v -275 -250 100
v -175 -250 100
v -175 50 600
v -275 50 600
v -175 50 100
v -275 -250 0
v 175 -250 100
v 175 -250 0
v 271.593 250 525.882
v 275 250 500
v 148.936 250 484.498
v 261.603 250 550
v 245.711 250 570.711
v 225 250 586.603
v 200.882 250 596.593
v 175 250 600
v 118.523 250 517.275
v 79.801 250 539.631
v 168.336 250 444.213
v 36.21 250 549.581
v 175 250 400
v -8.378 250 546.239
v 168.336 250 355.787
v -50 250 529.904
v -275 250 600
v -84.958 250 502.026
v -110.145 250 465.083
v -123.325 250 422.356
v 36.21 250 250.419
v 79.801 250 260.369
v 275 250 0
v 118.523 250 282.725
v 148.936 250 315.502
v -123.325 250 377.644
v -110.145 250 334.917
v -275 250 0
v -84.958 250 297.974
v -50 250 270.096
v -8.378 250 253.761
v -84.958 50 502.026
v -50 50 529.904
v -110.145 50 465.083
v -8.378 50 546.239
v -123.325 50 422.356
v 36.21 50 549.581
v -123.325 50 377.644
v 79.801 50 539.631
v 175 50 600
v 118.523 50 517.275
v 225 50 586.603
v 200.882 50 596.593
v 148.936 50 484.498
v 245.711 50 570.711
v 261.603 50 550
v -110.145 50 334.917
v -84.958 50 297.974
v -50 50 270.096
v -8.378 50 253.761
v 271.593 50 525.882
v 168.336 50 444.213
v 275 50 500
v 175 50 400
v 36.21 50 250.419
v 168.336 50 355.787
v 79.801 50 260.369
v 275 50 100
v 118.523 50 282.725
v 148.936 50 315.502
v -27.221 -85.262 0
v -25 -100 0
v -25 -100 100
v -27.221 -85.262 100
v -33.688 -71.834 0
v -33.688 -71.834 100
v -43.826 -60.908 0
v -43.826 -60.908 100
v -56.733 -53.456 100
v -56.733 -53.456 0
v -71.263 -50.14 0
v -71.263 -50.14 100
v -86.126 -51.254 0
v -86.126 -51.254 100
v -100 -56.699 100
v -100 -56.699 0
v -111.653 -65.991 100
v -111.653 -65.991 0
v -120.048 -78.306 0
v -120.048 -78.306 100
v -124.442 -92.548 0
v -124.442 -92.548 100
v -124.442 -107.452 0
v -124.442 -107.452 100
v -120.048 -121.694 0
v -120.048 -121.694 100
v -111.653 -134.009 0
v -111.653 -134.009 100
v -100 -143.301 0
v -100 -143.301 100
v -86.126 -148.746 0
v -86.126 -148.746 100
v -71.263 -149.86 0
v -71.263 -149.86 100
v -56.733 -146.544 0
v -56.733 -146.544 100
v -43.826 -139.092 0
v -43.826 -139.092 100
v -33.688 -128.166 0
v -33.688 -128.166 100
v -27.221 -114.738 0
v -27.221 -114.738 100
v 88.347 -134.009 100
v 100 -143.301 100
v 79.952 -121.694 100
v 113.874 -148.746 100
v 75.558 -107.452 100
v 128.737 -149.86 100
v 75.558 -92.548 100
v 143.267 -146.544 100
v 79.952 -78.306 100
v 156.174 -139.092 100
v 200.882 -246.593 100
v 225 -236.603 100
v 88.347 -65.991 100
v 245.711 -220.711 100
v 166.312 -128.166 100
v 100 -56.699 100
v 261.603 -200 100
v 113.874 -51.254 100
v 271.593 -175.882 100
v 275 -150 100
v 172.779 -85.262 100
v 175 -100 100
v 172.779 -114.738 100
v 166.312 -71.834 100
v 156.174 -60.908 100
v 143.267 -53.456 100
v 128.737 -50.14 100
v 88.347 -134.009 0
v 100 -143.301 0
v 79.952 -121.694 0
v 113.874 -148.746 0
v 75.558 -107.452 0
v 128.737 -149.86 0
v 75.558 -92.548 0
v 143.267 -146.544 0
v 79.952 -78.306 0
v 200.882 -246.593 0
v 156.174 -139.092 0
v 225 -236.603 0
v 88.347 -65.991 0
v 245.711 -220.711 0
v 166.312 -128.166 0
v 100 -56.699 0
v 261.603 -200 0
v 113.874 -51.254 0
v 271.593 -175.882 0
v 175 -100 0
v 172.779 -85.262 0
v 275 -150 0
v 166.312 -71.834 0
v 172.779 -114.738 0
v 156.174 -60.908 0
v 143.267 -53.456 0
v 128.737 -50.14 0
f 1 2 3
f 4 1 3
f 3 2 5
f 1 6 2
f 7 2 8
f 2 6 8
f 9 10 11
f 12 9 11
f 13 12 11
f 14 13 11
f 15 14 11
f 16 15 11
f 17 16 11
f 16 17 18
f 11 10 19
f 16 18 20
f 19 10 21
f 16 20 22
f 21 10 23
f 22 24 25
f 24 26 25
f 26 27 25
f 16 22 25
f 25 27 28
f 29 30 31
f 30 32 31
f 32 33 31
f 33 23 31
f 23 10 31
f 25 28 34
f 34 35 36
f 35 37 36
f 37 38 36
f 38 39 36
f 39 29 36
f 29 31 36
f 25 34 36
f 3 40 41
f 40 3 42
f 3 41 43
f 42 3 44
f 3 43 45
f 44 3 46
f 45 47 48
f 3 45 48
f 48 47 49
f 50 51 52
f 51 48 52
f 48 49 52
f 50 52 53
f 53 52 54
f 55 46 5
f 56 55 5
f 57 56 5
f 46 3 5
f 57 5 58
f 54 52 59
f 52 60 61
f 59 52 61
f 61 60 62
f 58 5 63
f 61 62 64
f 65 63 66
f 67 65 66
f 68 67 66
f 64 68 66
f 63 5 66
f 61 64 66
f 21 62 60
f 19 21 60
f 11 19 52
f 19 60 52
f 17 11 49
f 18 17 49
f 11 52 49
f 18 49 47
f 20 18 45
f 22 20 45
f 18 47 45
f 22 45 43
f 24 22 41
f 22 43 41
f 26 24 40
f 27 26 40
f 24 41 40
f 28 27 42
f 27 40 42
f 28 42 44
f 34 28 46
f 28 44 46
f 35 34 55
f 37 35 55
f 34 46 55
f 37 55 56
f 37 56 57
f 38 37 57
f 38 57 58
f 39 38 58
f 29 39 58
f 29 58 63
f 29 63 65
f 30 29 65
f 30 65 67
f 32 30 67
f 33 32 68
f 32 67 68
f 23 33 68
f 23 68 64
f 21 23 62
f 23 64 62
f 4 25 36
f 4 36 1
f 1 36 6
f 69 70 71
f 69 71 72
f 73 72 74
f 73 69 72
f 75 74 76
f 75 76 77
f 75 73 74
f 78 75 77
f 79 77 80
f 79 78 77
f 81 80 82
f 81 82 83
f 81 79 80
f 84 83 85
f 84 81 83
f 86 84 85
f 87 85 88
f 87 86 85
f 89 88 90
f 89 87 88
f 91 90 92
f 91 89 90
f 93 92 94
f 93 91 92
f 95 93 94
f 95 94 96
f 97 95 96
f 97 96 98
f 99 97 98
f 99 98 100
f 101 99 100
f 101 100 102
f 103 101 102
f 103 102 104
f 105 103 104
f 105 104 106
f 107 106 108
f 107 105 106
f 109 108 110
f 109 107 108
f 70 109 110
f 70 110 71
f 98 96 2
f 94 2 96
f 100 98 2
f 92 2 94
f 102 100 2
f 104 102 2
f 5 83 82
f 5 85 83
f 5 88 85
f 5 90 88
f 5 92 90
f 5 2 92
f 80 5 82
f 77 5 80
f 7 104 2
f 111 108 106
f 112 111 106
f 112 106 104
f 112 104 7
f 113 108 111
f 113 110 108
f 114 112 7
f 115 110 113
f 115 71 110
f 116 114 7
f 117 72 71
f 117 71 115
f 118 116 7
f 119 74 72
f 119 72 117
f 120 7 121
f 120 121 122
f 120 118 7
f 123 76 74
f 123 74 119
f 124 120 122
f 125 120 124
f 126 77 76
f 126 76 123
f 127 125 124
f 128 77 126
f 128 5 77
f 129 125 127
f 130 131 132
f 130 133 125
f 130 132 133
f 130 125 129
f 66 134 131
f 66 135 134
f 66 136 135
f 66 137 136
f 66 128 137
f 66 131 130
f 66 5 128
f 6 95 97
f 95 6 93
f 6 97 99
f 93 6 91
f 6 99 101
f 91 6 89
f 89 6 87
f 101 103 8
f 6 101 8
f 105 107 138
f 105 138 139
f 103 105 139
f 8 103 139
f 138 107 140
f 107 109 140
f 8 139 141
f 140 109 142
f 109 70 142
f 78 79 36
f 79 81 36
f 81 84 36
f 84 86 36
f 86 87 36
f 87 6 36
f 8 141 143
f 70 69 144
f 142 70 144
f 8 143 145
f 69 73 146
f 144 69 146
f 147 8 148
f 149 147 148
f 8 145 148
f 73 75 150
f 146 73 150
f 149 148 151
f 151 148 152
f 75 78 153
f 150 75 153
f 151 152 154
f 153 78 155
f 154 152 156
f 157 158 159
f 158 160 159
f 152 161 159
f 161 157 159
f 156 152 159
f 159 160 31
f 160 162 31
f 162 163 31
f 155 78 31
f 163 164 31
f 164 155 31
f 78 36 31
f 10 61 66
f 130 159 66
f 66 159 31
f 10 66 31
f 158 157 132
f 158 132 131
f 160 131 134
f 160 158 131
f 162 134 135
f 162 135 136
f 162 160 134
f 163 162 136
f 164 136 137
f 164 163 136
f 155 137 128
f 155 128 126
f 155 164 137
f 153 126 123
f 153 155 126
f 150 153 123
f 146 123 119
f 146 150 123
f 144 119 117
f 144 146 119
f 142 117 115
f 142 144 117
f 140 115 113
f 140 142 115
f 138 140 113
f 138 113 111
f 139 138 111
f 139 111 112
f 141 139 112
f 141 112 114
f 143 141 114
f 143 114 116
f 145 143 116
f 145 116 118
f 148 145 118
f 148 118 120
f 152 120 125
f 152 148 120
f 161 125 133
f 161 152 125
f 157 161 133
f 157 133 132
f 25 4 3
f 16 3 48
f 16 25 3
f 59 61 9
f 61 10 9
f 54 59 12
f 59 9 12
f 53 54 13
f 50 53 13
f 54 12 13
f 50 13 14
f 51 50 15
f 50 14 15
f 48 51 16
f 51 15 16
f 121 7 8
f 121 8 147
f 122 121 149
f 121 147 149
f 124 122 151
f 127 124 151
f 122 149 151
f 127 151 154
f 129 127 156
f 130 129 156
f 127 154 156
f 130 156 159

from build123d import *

# Parameters (mm, degrees)
F0_R     = 50
F0_W     = 100
F0_H     = 300
F1_DEPTH = 100
F2_DEPTH = 600
F3_R     = 100
F5_DEPTH = 100
F6_R     = 150
F7_DEPTH = 200


with BuildPart() as f1:
    # F0 (on Top) → F1 (new body)
    with BuildSketch(Plane.XY):
        with BuildLine():
            Line((-175, -250), (175, -250))
            ThreePointArc((175, -250), (245.7106781187, -220.7106781187), (275, -150))
            Line((275, -150), (275, 50))
            Line((275, 50), (-175, 50))
            Line((-175, 50), (-175, -250))
        make_face()
        with Locations((-75, -100)):
            Circle(F0_R, mode=Mode.SUBTRACT)
        with Locations((125, -100)):
            Circle(F0_R, mode=Mode.SUBTRACT)
        Polygon((-275, 50), (-175, 50), (275, 50), (275, 250), (-275, 250), align=None)
        with Locations((-225, -100)):
            Rectangle(F0_W, F0_H)
    extrude(amount=F1_DEPTH)

    # F0 (on Top) → F2 (join)
    with BuildSketch(Plane.XY):
        Polygon((-275, 50), (-175, 50), (275, 50), (275, 250), (-275, 250), align=None)
        with Locations((-225, -100)):
            Rectangle(F0_W, F0_H)
    extrude(amount=F2_DEPTH)

    # F3
    f3_edges = [f1.edges().sort_by_distance(p)[0] for p in [
        (275, 150, 600),
    ]]
    fillet(f3_edges, radius=F3_R)

    # F4 (on face) → F5 (cut)
    with BuildSketch(Plane.YZ.offset(-175)):
        Polygon((-250, 100), (50, 600), (-250, 600), align=None)
    extrude(amount=-F5_DEPTH, mode=Mode.SUBTRACT)

    # F6 (on face) → F7 (cut)
    with BuildSketch(Plane.XZ.offset(-50)):
        with Locations((25, 400)):
            Circle(F6_R)
    extrude(amount=-F7_DEPTH, mode=Mode.SUBTRACT)


solid = f1.part
